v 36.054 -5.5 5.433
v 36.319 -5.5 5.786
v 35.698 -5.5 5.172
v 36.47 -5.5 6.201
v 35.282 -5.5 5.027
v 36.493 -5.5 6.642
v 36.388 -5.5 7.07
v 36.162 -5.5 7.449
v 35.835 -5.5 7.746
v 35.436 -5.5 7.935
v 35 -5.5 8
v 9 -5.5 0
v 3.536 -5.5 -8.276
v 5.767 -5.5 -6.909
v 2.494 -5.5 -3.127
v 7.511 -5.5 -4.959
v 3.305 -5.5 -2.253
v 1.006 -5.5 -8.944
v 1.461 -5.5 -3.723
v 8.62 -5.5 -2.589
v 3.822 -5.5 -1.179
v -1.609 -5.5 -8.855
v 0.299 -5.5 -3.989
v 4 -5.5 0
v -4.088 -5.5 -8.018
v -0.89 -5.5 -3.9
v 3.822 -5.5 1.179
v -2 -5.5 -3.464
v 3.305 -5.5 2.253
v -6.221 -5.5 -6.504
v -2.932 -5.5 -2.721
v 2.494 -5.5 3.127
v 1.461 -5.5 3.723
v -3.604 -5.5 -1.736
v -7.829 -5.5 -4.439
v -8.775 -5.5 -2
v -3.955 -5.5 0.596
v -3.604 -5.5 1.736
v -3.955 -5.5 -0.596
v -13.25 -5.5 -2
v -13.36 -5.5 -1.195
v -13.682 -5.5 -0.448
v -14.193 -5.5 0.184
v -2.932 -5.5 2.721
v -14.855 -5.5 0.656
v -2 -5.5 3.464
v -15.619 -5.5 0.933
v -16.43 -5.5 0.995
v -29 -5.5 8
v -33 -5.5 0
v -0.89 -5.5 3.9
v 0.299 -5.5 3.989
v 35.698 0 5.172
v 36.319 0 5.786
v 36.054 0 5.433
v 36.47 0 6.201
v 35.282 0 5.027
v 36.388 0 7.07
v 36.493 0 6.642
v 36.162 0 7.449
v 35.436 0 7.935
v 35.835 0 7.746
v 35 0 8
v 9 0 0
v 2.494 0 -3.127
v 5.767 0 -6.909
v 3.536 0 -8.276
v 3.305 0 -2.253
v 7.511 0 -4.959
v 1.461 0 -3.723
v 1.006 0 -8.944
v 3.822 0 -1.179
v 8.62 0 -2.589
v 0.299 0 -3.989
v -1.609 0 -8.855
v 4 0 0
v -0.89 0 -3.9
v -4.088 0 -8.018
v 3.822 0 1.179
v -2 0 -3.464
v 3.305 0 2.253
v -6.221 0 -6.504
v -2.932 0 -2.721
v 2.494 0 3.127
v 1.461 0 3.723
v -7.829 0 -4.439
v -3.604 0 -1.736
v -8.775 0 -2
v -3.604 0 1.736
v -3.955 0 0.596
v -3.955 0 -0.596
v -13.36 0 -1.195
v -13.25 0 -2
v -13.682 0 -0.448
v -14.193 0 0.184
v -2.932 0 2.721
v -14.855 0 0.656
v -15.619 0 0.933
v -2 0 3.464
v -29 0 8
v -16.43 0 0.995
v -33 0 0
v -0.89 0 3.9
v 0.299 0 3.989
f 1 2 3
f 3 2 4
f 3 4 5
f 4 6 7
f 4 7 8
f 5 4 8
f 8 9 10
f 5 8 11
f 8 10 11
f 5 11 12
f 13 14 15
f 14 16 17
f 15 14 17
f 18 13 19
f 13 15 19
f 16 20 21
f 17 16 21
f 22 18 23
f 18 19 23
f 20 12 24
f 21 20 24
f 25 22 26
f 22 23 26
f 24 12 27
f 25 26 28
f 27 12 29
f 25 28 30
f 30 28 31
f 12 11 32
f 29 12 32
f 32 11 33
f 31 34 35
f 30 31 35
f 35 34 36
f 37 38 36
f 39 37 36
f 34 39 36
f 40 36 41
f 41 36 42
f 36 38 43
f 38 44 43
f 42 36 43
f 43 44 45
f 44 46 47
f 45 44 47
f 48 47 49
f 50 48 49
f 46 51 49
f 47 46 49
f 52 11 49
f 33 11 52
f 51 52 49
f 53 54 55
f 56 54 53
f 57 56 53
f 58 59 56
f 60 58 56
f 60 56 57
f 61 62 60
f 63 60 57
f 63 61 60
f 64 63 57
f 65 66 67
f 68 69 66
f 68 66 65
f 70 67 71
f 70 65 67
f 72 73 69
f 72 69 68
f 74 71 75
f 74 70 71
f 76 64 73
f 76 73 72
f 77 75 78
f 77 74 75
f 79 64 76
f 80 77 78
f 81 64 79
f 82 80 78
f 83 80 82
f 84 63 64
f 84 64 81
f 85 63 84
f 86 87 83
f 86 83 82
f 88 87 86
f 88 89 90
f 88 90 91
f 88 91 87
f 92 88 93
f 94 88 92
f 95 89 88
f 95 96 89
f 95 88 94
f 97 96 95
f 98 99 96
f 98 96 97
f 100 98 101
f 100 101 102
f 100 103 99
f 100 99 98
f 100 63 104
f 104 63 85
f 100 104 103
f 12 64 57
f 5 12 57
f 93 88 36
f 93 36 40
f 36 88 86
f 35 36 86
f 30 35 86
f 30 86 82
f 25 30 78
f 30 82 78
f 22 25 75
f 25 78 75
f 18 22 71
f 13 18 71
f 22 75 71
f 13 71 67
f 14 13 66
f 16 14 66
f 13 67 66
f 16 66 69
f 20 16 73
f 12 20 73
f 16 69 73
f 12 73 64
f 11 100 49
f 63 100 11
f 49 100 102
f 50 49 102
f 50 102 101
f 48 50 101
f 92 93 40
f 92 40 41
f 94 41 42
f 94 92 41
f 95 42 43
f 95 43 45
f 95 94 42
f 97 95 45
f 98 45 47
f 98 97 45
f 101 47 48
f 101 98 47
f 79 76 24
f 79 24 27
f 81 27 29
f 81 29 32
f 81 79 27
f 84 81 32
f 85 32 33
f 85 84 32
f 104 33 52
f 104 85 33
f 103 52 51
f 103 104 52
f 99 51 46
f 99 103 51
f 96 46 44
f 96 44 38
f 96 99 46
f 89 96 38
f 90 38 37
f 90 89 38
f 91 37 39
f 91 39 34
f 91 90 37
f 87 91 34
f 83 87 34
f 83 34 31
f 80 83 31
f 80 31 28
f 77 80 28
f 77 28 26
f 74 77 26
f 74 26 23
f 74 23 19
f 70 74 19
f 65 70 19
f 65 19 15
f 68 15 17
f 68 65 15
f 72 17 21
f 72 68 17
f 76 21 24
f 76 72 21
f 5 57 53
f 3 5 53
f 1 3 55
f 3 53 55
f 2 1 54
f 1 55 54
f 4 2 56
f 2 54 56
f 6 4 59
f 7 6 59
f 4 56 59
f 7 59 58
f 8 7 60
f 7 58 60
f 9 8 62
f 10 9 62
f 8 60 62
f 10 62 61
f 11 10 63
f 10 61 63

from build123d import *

# Parameters (mm, degrees)
SKETCH_R  = 4
PAD_DEPTH = 5.5


with BuildPart() as part:
    # Sketch → Pad (new body)
    with BuildSketch(Plane.XZ):
        with BuildLine():
            Line((-29, 8), (35, 8))
            ThreePointArc((35.281785, 5.026705), (36.493309, 6.641524), (35, 8))
            Line((9, 0), (35.281785, 5.026705))
            ThreePointArc((-8.774964, -2), (1.00631, -8.943564), (9, 0))
            Line((-8.774964, -2), (-13.249792, -2))
            ThreePointArc((-13.249792, -2), (-14.193003, 0.183946), (-16.429538, 0.99461))
            Line((-33, 0), (-16.429538, 0.99461))
            Line((-29, 8), (-33, 0))
        make_face()
        Circle(SKETCH_R, mode=Mode.SUBTRACT)
    extrude(amount=PAD_DEPTH)


solid = part.part
